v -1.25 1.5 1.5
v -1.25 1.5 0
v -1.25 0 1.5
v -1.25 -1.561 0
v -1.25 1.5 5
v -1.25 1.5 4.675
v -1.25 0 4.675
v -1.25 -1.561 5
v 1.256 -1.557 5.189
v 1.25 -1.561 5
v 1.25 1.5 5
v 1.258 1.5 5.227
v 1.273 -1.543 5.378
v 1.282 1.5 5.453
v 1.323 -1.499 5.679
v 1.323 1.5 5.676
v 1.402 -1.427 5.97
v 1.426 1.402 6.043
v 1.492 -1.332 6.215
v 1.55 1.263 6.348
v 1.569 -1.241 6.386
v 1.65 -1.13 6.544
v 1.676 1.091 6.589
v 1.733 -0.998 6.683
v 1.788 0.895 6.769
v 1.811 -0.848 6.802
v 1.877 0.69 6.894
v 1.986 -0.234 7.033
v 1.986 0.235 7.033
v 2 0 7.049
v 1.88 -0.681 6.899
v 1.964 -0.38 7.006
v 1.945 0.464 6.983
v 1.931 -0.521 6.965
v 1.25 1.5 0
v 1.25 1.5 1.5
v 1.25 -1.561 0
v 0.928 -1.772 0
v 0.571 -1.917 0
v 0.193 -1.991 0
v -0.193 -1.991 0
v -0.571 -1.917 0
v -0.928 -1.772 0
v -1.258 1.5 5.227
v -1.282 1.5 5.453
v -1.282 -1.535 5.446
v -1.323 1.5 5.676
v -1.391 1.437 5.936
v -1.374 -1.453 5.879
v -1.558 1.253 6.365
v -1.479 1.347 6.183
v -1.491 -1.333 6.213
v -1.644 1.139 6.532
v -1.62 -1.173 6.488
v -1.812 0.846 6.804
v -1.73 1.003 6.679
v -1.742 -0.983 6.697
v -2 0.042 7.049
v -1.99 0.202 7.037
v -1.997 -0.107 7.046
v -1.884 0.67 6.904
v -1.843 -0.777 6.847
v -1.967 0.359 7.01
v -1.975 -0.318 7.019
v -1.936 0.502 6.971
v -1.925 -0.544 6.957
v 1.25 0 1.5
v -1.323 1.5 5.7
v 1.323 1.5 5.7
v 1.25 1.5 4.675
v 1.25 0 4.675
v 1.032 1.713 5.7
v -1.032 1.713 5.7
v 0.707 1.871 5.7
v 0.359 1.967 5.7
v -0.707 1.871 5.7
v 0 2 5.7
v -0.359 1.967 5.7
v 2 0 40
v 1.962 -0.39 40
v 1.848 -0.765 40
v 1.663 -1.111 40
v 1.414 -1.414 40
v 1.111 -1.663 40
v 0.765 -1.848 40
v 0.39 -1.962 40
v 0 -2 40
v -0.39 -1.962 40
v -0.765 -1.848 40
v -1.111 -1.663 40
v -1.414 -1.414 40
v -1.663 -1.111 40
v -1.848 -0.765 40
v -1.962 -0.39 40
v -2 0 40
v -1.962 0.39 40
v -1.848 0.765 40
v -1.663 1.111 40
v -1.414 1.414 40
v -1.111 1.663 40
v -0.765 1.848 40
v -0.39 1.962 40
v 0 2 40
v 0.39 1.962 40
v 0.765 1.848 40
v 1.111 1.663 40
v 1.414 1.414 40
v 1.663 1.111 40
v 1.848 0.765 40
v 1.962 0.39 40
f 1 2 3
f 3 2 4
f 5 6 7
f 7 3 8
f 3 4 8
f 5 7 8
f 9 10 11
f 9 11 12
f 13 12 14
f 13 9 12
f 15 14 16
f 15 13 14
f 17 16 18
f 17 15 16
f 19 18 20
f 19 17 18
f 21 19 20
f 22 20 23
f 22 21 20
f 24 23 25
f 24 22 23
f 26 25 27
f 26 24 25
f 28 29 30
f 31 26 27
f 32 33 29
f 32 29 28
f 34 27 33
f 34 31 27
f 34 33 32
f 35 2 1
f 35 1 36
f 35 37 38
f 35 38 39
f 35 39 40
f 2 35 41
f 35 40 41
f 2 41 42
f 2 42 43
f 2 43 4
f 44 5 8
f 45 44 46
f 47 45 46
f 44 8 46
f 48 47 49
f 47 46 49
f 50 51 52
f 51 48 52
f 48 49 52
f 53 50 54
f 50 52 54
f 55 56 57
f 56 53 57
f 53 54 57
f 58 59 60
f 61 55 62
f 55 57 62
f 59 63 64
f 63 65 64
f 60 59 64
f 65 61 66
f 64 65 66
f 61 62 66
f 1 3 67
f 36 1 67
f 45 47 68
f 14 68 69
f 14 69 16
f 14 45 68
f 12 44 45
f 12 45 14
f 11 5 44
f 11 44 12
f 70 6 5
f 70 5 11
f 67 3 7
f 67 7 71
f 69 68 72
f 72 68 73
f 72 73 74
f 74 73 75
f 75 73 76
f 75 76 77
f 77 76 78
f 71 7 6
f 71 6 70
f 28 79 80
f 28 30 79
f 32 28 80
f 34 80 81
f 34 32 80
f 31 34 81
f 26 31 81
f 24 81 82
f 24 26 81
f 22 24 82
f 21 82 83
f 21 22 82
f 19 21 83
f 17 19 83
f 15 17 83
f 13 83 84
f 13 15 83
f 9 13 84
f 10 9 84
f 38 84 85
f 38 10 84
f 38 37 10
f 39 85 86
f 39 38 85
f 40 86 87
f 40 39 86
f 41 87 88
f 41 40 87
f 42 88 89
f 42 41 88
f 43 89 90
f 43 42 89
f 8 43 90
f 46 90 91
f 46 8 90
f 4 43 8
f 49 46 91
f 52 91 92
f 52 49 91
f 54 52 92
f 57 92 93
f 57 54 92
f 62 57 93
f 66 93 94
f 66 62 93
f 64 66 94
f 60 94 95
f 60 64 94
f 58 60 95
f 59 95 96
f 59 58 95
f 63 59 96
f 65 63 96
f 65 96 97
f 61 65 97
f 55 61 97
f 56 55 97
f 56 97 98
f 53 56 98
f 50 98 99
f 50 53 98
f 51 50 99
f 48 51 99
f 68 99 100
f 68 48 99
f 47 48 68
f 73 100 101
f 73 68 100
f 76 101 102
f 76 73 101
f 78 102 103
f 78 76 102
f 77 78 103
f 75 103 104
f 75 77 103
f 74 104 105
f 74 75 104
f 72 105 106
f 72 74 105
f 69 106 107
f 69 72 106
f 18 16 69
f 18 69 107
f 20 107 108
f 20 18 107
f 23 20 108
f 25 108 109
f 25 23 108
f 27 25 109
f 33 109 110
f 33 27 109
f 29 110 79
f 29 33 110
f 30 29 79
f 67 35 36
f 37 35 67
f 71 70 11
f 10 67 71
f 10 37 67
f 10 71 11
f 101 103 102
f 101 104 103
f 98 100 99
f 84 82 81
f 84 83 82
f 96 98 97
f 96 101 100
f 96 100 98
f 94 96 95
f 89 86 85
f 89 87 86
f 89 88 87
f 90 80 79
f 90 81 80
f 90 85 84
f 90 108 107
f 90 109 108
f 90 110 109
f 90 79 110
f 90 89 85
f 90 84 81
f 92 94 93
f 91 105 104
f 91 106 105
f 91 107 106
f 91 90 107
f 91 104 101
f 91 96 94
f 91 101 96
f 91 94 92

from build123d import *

# Parameters (mm, degrees)
SKETCH1_W               = 40
SKETCH1_H               = 2
CUT_EXTRUDE1_DEPTH      = 41.099875312
CUT_EXTRUDE1_DEPTH_BACK = 41.099875312
CUT_EXTRUDE2_START      = 1.5
SKETCH3_W               = 4
SKETCH3_H               = 5.7
CUT_EXTRUDE2_DEPTH      = 39.599875421
SKETCH4_W               = 2.5
SKETCH4_H               = 3.175
CUT_EXTRUDE3_DEPTH      = 41.099875421


with BuildPart() as part:
    # Sketch1 → Revolve1 (revolve)
    with BuildSketch(Plane(origin=(0, 0, 0), x_dir=(0, 0, -1), z_dir=(1, 0, 0))):
        with Locations((-20, 1)):
            Rectangle(SKETCH1_W, SKETCH1_H)
    revolve(axis=Axis((0, 0, -0.721189591), (0, 0, -1)))

    # Sketch2 → Cut-Extrude1 (cut, two sides: drawn at the far end of the back side and taken through both)
    with BuildSketch(Plane(origin=(0, 0, 0), x_dir=(1, 0, 0), z_dir=(0, 1, 0)).offset(-CUT_EXTRUDE1_DEPTH_BACK)):
        with BuildLine():
            Line((-1.25, 0), (-1.25, -5))
            ThreePointArc((-1.25, -5), (-2.17993597, -7.24506403), (-4.425, -8.175))
            Line((-4.425, -8.175), (-4.425, 0))
            Line((-4.425, 0), (-1.25, 0))
        make_face()
        with BuildLine():
            Line((1.25, 0), (1.25, -5))
            ThreePointArc((1.25, -5), (2.17993597, -7.24506403), (4.425, -8.175))
            Line((4.425, -8.175), (4.425, 0))
            Line((4.425, 0), (1.25, 0))
        make_face()
    extrude(amount=CUT_EXTRUDE1_DEPTH + CUT_EXTRUDE1_DEPTH_BACK, mode=Mode.SUBTRACT)

    # Sketch3 → Cut-Extrude2 (cut, through all)
    with BuildSketch(Plane(origin=(0, 0, 0), x_dir=(1, 0, 0), z_dir=(0, 1, 0)).offset(CUT_EXTRUDE2_START)):
        with Locations((0, -2.85)):
            Rectangle(SKETCH3_W, SKETCH3_H)
    extrude(amount=CUT_EXTRUDE2_DEPTH, mode=Mode.SUBTRACT)

    # Sketch4 → Cut-Extrude3 (cut, through all)
    with BuildSketch(Plane(origin=(0, 0, 0), x_dir=(1, 0, 0), z_dir=(0, 1, 0))):
        with Locations((0, -3.0875)):
            Rectangle(SKETCH4_W, SKETCH4_H)
    extrude(amount=CUT_EXTRUDE3_DEPTH, mode=Mode.SUBTRACT)


solid = part.part
